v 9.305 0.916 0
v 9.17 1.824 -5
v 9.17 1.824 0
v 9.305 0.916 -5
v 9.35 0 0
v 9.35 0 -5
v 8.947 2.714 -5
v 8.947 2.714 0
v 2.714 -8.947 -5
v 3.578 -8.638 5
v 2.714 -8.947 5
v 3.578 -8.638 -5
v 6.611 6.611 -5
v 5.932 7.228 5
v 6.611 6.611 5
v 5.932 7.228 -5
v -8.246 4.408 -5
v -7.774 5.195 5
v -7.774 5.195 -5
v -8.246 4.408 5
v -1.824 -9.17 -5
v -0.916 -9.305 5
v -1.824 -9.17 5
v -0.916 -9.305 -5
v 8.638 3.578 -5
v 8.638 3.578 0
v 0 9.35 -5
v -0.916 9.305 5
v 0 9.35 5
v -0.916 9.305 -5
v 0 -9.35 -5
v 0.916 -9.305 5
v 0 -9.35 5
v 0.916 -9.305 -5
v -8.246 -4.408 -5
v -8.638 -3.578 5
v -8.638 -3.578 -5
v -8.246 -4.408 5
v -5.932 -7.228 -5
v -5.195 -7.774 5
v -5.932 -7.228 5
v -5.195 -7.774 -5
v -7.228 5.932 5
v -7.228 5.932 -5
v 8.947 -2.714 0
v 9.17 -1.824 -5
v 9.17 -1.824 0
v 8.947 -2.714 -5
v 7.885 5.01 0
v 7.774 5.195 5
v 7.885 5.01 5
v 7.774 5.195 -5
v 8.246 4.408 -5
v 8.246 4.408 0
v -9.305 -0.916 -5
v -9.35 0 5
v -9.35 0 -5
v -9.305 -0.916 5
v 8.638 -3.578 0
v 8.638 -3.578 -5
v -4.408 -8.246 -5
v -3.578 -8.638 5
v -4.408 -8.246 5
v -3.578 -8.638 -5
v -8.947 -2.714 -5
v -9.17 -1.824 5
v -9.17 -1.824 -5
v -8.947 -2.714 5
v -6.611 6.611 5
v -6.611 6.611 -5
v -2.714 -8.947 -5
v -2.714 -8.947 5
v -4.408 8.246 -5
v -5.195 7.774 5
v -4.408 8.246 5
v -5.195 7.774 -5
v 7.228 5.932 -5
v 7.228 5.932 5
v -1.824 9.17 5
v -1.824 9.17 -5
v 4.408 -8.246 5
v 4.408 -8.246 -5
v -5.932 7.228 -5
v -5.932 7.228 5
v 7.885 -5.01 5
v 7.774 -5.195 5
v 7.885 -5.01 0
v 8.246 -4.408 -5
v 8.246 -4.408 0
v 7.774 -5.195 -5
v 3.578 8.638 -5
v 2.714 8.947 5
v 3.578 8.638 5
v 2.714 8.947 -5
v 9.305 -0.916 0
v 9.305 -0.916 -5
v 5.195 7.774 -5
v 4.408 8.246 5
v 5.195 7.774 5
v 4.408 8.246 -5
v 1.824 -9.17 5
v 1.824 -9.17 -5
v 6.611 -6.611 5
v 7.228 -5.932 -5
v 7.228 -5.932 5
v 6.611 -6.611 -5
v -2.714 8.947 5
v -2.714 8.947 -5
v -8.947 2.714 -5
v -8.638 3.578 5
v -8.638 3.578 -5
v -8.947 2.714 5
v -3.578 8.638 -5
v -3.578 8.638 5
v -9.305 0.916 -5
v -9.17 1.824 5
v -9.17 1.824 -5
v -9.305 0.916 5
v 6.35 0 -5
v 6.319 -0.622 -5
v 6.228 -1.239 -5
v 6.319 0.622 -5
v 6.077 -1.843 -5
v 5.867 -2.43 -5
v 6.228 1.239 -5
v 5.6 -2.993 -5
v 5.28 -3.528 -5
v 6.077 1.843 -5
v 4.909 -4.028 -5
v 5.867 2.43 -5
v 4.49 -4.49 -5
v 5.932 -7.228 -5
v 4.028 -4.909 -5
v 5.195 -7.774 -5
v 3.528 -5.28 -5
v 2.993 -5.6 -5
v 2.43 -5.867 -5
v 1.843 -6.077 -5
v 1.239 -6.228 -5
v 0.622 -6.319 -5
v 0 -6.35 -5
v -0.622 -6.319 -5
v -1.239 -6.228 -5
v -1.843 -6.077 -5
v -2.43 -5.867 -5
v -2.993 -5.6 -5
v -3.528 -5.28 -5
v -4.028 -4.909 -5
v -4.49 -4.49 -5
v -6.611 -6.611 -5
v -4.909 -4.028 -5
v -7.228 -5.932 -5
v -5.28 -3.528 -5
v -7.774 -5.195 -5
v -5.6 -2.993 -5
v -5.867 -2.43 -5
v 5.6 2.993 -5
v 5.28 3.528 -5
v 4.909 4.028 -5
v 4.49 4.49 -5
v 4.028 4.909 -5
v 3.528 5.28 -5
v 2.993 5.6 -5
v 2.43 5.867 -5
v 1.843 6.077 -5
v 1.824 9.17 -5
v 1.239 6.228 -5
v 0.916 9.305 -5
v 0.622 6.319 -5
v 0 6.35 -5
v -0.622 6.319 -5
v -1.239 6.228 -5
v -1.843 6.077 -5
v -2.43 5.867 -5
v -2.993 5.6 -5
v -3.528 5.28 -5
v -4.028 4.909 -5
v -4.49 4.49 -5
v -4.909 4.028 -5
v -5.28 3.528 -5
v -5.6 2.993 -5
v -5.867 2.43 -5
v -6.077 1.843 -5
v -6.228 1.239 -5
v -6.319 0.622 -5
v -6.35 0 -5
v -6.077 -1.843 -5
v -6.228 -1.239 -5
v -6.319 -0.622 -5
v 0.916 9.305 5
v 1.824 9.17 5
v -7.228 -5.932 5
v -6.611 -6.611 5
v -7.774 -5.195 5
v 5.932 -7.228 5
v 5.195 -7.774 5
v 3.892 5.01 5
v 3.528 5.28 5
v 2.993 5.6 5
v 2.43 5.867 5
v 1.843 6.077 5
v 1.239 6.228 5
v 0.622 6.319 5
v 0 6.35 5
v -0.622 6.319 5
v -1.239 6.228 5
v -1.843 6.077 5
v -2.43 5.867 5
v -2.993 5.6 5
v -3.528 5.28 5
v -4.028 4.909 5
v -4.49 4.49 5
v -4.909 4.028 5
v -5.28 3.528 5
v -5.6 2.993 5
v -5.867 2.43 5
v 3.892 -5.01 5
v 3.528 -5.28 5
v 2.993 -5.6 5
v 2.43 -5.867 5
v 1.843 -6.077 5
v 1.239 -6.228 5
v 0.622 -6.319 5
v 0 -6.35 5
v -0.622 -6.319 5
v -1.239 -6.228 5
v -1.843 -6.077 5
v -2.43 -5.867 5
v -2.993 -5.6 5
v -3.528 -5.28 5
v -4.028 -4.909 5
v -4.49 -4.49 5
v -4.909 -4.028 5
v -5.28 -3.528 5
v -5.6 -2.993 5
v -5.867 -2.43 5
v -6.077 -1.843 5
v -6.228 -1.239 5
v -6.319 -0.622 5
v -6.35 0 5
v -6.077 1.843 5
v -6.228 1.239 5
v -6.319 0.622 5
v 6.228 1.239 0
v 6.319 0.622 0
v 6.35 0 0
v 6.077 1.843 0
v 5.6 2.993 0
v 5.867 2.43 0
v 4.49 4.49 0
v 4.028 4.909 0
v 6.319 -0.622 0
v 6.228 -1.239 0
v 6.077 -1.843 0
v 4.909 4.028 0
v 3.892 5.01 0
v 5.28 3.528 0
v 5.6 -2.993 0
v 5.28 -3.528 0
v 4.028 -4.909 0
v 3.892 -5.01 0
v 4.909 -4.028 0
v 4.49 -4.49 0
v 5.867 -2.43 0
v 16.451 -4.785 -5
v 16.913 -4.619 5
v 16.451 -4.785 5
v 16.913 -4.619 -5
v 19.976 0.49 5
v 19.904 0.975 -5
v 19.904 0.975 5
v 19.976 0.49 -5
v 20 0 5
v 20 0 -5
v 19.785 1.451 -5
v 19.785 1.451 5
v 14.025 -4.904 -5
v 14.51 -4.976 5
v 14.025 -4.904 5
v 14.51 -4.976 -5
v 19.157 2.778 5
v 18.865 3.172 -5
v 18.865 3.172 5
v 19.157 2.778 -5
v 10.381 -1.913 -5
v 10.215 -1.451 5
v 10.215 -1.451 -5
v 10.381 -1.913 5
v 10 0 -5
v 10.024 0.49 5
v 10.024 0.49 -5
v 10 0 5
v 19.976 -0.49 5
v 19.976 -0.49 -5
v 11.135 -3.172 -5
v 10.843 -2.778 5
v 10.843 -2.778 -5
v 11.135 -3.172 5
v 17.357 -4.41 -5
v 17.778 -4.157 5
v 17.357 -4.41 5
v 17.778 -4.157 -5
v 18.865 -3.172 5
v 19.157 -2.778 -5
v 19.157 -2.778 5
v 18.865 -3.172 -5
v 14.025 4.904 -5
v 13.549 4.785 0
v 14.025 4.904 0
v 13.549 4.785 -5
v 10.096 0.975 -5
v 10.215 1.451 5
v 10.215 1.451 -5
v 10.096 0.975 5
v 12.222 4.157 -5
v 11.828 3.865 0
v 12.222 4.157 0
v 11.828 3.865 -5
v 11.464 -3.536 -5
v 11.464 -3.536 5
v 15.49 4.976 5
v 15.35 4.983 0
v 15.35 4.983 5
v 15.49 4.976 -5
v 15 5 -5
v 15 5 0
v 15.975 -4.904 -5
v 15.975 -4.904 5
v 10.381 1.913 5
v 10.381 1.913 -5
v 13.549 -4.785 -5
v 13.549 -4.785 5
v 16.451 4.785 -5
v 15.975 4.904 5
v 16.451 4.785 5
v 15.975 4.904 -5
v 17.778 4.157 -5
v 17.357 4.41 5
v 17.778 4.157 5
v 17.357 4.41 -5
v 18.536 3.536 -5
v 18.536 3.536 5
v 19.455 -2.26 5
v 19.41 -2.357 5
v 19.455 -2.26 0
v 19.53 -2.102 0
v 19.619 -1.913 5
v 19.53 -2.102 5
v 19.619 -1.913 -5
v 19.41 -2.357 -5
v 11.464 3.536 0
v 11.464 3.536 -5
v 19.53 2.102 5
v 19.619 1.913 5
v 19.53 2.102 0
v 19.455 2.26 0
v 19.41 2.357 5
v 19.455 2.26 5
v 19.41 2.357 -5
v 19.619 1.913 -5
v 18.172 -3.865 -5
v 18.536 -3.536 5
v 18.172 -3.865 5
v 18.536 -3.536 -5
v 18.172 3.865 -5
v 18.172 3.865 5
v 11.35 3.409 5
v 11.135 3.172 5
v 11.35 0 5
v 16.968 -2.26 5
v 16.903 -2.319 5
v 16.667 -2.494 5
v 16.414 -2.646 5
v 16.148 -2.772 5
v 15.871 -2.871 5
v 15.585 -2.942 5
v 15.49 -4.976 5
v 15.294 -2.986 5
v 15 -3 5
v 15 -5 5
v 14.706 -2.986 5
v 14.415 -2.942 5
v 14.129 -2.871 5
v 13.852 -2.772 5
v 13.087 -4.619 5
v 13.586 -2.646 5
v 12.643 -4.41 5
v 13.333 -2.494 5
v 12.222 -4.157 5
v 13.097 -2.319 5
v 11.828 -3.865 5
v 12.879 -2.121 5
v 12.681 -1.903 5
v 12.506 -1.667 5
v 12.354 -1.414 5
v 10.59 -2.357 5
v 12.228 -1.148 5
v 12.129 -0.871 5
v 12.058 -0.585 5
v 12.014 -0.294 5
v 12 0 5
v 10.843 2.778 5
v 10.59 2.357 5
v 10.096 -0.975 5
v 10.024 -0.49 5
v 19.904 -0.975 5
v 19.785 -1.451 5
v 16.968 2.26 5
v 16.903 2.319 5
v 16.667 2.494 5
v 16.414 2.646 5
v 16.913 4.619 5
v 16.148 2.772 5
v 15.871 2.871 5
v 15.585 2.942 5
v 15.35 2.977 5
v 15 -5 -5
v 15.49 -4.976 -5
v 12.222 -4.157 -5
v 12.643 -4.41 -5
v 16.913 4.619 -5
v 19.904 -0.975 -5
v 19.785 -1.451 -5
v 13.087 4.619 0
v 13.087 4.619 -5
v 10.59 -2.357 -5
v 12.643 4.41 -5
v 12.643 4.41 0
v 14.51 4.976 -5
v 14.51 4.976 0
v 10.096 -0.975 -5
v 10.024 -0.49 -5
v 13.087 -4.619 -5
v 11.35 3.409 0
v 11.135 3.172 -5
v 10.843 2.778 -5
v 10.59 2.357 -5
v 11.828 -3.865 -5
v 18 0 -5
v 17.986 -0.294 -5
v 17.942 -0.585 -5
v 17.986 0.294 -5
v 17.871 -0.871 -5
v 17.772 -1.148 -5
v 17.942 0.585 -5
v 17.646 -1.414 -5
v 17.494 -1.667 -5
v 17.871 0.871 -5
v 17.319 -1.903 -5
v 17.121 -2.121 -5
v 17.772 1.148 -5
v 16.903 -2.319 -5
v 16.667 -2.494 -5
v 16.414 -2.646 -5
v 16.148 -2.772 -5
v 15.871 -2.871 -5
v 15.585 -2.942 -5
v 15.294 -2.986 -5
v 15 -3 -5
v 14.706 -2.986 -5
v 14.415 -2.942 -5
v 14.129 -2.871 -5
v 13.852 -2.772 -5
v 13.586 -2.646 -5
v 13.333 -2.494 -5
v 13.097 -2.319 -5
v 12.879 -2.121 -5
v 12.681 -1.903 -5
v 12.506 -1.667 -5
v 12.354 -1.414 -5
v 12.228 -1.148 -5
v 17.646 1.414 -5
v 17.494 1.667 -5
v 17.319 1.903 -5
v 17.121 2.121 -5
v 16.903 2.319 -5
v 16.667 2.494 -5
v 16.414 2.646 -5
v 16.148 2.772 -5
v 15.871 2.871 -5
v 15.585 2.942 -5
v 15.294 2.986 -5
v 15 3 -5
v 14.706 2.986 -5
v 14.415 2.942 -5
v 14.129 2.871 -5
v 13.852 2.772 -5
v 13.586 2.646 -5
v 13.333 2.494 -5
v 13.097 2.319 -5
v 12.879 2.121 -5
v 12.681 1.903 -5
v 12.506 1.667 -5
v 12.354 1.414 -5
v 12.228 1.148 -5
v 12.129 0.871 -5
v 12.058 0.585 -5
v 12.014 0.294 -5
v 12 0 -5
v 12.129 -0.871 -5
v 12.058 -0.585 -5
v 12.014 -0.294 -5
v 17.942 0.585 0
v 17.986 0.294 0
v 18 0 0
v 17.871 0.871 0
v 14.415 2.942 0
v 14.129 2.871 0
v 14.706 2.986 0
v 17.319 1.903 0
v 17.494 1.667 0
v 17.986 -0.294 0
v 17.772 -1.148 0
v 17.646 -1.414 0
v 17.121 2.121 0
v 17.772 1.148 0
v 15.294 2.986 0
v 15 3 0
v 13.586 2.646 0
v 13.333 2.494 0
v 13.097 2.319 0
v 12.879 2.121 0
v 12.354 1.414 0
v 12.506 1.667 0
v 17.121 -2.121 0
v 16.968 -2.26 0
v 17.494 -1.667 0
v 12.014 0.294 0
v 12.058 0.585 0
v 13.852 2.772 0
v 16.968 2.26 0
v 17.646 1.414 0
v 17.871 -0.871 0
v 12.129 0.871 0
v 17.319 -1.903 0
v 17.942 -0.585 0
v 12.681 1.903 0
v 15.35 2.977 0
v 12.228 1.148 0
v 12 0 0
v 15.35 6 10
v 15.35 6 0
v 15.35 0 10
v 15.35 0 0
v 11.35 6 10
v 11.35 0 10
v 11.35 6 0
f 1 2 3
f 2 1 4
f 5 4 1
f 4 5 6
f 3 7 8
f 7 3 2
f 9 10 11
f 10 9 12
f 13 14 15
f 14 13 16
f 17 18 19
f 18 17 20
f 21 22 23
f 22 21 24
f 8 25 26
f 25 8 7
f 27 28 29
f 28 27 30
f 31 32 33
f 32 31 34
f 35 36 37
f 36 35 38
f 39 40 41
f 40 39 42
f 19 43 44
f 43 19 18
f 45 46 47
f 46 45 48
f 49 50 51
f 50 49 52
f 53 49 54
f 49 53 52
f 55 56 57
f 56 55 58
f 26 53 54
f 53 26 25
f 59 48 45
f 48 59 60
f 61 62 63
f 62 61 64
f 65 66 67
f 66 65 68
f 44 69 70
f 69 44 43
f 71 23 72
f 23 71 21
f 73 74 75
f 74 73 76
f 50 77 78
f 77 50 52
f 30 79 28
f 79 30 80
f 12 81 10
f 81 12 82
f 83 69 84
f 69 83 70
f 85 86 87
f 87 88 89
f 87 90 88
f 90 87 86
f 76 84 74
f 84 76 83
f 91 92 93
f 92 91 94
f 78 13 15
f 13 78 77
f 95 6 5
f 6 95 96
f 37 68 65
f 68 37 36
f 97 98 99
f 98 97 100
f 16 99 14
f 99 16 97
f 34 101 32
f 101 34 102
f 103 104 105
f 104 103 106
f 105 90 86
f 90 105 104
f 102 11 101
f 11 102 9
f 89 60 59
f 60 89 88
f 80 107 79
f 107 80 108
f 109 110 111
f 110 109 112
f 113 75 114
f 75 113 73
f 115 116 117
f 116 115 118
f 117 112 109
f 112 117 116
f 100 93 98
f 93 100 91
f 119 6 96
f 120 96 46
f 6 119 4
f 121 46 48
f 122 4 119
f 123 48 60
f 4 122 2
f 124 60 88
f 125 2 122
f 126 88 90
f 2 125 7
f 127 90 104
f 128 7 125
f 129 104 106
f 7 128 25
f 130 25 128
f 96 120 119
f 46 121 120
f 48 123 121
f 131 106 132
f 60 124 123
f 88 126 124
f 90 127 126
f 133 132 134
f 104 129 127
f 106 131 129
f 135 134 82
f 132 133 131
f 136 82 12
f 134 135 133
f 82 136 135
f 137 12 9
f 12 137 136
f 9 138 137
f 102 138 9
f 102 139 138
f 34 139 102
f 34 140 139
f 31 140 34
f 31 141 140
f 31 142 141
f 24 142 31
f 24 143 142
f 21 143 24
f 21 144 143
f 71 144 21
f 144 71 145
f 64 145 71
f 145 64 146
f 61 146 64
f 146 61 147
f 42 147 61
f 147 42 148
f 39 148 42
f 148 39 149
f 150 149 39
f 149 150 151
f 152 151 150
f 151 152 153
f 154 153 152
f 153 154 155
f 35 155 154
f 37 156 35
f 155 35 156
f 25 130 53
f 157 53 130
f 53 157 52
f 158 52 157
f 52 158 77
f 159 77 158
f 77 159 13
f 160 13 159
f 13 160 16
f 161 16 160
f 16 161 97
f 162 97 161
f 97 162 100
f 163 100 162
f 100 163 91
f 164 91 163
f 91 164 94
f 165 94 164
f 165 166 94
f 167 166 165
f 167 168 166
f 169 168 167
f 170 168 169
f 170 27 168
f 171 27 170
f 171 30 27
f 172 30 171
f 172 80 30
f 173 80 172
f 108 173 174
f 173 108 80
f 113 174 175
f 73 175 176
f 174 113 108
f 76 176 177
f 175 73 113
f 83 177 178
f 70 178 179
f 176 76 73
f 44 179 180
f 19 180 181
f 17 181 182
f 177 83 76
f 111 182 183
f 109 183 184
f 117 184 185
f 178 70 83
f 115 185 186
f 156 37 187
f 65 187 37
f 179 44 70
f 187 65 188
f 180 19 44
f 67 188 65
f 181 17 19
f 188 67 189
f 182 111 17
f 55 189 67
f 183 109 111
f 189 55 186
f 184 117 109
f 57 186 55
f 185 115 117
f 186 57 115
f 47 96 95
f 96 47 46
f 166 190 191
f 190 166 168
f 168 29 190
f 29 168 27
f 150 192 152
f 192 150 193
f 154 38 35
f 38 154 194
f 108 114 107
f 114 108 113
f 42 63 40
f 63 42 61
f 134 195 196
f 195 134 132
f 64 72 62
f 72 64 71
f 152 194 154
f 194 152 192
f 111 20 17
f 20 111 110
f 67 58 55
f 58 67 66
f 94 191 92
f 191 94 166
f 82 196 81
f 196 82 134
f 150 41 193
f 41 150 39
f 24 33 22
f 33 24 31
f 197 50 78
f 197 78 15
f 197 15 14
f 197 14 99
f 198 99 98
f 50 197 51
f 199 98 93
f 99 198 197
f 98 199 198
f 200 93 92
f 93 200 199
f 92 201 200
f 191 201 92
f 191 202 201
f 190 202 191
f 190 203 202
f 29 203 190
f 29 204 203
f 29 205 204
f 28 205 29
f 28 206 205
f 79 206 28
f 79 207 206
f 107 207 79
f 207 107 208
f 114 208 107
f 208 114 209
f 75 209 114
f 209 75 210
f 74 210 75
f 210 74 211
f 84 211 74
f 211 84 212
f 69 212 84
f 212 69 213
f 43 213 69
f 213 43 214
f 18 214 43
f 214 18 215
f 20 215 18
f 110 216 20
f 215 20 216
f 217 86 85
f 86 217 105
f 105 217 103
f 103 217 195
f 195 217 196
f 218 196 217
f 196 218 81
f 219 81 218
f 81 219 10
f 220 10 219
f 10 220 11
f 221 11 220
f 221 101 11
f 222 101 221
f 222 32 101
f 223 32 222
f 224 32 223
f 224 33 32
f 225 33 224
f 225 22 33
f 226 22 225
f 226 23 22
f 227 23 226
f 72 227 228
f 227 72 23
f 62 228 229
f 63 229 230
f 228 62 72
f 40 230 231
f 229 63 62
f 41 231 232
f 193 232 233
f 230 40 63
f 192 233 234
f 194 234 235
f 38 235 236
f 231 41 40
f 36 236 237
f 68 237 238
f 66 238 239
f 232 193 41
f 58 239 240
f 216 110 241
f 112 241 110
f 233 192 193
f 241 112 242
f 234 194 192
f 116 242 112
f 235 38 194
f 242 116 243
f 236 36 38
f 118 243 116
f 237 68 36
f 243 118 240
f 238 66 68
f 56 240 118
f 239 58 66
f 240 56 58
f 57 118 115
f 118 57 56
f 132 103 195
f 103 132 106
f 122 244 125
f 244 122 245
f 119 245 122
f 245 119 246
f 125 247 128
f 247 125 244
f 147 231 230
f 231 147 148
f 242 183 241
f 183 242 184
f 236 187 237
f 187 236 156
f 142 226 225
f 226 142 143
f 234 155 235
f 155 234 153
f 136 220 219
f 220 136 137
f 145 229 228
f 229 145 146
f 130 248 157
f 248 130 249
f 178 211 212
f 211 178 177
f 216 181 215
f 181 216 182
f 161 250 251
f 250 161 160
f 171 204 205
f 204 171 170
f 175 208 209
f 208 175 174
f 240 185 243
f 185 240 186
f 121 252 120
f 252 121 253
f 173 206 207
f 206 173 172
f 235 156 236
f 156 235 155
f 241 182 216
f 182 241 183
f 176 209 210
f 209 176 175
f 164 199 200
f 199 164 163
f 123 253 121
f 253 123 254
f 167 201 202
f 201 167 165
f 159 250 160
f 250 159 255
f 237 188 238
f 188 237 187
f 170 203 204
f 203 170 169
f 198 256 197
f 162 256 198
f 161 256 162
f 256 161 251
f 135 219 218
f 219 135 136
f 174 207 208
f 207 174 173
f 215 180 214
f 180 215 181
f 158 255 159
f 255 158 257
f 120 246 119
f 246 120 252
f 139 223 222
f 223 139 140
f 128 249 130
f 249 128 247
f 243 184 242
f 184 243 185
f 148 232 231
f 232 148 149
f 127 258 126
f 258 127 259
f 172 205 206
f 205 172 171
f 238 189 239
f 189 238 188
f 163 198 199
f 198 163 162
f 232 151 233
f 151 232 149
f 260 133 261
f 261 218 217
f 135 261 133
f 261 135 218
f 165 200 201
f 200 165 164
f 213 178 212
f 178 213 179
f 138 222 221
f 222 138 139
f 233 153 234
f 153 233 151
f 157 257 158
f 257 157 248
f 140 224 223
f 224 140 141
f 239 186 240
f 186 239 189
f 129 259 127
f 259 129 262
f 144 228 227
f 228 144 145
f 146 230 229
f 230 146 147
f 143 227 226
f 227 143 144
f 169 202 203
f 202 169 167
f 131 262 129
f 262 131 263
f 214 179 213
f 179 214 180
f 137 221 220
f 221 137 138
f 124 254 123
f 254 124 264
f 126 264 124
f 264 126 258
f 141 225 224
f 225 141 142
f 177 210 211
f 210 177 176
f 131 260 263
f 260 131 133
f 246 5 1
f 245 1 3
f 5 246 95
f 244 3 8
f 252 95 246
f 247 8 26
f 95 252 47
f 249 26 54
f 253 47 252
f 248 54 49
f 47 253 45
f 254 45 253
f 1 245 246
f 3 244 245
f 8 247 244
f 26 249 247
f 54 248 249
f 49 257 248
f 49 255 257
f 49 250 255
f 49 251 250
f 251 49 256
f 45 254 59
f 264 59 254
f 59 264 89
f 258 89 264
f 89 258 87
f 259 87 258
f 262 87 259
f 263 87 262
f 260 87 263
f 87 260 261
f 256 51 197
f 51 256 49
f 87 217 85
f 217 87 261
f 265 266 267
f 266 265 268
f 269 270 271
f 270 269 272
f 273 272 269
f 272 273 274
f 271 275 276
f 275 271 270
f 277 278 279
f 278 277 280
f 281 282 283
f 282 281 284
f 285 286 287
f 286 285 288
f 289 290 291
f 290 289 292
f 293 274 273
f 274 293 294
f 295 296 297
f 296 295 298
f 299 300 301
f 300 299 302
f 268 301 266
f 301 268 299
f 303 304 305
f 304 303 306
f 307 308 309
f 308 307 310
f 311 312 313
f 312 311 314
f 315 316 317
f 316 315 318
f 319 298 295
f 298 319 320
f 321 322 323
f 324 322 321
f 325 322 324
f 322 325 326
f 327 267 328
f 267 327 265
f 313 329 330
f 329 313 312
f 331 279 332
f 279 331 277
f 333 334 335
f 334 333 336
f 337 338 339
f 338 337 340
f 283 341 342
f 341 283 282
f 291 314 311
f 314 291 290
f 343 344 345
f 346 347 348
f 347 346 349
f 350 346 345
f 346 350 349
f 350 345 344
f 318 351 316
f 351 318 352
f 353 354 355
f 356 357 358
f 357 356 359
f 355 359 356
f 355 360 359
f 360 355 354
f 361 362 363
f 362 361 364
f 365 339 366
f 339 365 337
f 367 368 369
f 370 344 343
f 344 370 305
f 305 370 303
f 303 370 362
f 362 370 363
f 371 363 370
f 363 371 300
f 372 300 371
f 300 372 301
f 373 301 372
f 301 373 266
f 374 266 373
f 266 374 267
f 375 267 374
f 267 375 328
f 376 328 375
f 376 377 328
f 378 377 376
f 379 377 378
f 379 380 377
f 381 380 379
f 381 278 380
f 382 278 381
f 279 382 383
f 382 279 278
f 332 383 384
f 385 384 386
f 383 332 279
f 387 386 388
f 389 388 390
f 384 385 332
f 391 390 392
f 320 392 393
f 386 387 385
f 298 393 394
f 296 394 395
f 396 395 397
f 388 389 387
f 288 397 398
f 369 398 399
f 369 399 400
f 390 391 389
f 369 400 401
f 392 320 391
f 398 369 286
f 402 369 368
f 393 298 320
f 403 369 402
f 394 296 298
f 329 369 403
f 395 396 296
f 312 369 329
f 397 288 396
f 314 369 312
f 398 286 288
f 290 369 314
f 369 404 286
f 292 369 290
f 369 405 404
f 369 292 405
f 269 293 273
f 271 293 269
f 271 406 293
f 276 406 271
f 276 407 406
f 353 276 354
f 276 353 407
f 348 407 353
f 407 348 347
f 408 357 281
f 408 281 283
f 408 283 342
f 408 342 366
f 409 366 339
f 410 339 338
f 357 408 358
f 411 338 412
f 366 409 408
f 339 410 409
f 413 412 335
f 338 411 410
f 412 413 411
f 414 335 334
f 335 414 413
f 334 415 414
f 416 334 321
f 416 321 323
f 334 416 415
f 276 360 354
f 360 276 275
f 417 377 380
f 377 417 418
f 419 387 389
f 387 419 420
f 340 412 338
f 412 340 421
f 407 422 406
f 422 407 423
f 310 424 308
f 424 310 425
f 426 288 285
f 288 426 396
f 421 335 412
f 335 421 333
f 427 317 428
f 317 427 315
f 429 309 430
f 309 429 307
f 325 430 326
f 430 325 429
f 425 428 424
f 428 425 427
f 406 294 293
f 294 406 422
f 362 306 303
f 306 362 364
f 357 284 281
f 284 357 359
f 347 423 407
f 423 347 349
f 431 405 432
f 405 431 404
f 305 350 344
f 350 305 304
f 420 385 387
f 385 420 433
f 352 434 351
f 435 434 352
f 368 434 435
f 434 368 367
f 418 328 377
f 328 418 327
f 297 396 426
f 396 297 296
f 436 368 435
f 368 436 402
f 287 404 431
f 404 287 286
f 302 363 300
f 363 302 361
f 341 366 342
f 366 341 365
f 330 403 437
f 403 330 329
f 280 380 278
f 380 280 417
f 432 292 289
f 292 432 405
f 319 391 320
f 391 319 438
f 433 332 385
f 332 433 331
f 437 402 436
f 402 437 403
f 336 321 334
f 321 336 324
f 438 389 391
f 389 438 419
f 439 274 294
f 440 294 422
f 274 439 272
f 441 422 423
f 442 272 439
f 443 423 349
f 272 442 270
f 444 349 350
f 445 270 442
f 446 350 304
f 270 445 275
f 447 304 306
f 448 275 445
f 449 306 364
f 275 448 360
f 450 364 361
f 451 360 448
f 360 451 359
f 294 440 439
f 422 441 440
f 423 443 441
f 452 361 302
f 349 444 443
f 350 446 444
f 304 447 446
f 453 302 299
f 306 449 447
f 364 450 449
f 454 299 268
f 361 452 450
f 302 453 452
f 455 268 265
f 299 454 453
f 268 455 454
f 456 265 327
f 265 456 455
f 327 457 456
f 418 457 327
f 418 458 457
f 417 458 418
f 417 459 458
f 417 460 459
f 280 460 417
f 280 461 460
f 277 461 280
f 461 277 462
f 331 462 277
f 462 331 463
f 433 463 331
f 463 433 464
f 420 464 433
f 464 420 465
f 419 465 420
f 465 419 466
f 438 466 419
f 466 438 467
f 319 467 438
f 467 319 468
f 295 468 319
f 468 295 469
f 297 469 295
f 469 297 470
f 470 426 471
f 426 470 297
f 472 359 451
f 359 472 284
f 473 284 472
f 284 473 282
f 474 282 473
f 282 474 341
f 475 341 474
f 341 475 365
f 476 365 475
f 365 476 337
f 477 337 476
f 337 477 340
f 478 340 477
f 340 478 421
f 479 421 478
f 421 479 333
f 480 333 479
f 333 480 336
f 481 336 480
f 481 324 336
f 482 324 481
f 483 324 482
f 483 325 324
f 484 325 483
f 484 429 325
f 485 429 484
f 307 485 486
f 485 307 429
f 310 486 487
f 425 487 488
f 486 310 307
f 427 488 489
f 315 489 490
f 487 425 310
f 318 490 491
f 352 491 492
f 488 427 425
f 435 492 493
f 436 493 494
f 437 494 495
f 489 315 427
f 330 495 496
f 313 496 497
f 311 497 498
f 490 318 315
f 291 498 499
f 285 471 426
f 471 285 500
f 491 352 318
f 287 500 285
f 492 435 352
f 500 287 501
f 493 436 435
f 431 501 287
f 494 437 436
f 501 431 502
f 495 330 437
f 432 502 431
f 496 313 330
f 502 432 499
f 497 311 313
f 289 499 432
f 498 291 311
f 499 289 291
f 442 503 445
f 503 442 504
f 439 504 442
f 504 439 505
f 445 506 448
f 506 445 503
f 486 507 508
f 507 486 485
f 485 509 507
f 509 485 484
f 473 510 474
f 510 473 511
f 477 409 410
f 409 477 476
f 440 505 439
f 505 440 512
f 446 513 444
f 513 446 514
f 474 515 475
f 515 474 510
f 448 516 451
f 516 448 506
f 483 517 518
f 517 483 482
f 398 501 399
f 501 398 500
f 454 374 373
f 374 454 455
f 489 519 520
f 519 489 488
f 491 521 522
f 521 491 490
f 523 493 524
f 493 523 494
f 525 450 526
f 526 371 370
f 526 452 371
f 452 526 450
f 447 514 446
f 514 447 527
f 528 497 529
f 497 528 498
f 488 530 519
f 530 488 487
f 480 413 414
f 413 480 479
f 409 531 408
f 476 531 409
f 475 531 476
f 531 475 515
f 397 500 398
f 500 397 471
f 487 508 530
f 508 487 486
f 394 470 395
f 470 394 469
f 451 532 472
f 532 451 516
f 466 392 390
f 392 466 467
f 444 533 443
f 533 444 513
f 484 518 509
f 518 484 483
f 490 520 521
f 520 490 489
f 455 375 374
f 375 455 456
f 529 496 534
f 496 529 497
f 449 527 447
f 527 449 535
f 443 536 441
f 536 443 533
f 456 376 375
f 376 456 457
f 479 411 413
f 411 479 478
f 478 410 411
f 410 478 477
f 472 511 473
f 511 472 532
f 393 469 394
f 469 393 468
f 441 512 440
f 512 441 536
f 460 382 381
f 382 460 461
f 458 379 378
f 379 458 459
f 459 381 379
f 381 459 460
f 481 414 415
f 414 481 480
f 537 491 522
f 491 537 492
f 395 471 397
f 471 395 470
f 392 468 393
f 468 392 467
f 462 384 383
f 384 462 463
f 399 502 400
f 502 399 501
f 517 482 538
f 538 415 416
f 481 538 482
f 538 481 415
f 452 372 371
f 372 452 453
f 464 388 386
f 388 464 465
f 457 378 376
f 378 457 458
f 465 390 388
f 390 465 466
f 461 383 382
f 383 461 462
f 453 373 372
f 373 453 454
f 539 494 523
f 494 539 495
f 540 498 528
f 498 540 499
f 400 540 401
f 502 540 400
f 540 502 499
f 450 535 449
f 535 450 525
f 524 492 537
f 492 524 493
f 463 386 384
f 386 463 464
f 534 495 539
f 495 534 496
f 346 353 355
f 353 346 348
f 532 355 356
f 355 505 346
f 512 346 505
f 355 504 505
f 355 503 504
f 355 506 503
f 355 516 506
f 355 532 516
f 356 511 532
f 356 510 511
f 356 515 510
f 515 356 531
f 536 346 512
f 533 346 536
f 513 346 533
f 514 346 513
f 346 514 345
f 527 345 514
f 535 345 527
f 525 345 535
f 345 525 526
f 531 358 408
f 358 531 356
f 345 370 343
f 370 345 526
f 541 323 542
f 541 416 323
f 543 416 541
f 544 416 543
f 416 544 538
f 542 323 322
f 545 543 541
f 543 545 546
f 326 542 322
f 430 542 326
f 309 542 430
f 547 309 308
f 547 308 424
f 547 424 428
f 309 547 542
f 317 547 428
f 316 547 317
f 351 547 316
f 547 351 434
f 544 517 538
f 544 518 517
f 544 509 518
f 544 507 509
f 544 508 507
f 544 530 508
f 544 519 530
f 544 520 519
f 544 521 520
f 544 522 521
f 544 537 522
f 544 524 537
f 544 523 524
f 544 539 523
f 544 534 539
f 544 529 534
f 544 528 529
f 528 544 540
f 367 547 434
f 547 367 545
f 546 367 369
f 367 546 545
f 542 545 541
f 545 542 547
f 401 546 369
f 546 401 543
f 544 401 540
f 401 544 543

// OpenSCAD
// Snap-on Clip for Lab Stand Rod and Tubing
// Orientation: Flat on XY plane, building up in +Z.
// Units: Millimetres.

// --- Dimensions ---
// Rod Stand
$rod_diameter = 12.7;
$rod_wall_thickness = 3;
$rod_outer_diameter = $rod_diameter + 2 * $rod_wall_thickness; // 18.7
$rod_ring_height = 10;

// Tubing
$tubing_inner_diameter = 6;
$tubing_wall_thickness = 2;
$tubing_outer_diameter = $tubing_inner_diameter + 2 * $tubing_wall_thickness; // 10
$tubing_ring_height = 10;

// Bridge
$bridge_width_x = 4; // From x=8 to x=12
$bridge_width_y = 6;
$bridge_height = 10;

// Cutout Dimensions
$rod_cutout_width = 10;
$rod_cutout_y_limit = $rod_cutout_width / 2; // 5

$tubing_cutout_width = 4.5;
$tubing_cutout_y_limit = $tubing_cutout_width / 2; // 2.25

// Positioning
$rod_center_x = 0;
$rod_center_y = 0;

$tubing_center_x = 15;
$tubing_center_y = 0;

// --- Generation ---
$fn = 64;

// 1. Rod Ring
difference() {
    // Outer Ring
    translate([$rod_center_x, $rod_center_y, 0]) {
        cylinder(
            h = $rod_ring_height,
            d = $rod_outer_diameter,
            center = true
        );
    }
    
    // Inner Hole
    translate([$rod_center_x, $rod_center_y, 0]) {
        cylinder(
            h = $rod_ring_height + 0.1, // Extend slightly past top/bottom
            d = $rod_diameter,
            center = true
        );
    }
    
    // Cutout on -X side
    translate([$rod_center_x, $rod_center_y, 0]) {
        // Cutout is a rectangle: x < 0, -5 < y < 5
        // We create a shape that covers this area and extrude it up
        // To ensure clean cut, we extend slightly in Z
        difference() {
            // The "knife" shape that removes the material
            // We define a block that covers the cutout area
            translate([-0.01, -($rod_cutout_y_limit + 0.01), 0]) {
                cube([($rod_cutout_width + 0.02), ($rod_cutout_y_limit * 2 + 0.02), $rod_ring_height + 0.1]);
            }
        }
    }
}

// 2. Tubing Ring
difference() {
    // Outer Ring
    translate([$tubing_center_x, $tubing_center_y, 0]) {
        cylinder(
            h = $tubing_ring_height,
            d = $tubing_outer_diameter,
            center = true
        );
    }
    
    // Inner Hole
    translate([$tubing_center_x, $tubing_center_y, 0]) {
        cylinder(
            h = $tubing_ring_height + 0.1,
            d = $tubing_inner_diameter,
            center = true
        );
    }
    
    // Cutout on +X side
    translate([$tubing_center_x, $tubing_center_y, 0]) {
        difference() {
            // The "knife" shape
            translate([0.01, -($tubing_cutout_y_limit + 0.01), 0]) {
                cube([($tubing_cutout_width + 0.02), ($tubing_cutout_y_limit * 2 + 0.02), $tubing_ring_height + 0.1]);
            }
        }
    }
}

// 3. Solid Bridge
translate([($rod_center_x + $rod_outer_diameter / 2) + ($bridge_width_x / 2), 0, 0]) {
    // Center of bridge is at x = 10 (midpoint of 8 and 12)
    // Width in X is 4, Width in Y is 6
    cube([
        $bridge_width_x, 
        $bridge_width_y, 
        $bridge_height
    ]);
}
